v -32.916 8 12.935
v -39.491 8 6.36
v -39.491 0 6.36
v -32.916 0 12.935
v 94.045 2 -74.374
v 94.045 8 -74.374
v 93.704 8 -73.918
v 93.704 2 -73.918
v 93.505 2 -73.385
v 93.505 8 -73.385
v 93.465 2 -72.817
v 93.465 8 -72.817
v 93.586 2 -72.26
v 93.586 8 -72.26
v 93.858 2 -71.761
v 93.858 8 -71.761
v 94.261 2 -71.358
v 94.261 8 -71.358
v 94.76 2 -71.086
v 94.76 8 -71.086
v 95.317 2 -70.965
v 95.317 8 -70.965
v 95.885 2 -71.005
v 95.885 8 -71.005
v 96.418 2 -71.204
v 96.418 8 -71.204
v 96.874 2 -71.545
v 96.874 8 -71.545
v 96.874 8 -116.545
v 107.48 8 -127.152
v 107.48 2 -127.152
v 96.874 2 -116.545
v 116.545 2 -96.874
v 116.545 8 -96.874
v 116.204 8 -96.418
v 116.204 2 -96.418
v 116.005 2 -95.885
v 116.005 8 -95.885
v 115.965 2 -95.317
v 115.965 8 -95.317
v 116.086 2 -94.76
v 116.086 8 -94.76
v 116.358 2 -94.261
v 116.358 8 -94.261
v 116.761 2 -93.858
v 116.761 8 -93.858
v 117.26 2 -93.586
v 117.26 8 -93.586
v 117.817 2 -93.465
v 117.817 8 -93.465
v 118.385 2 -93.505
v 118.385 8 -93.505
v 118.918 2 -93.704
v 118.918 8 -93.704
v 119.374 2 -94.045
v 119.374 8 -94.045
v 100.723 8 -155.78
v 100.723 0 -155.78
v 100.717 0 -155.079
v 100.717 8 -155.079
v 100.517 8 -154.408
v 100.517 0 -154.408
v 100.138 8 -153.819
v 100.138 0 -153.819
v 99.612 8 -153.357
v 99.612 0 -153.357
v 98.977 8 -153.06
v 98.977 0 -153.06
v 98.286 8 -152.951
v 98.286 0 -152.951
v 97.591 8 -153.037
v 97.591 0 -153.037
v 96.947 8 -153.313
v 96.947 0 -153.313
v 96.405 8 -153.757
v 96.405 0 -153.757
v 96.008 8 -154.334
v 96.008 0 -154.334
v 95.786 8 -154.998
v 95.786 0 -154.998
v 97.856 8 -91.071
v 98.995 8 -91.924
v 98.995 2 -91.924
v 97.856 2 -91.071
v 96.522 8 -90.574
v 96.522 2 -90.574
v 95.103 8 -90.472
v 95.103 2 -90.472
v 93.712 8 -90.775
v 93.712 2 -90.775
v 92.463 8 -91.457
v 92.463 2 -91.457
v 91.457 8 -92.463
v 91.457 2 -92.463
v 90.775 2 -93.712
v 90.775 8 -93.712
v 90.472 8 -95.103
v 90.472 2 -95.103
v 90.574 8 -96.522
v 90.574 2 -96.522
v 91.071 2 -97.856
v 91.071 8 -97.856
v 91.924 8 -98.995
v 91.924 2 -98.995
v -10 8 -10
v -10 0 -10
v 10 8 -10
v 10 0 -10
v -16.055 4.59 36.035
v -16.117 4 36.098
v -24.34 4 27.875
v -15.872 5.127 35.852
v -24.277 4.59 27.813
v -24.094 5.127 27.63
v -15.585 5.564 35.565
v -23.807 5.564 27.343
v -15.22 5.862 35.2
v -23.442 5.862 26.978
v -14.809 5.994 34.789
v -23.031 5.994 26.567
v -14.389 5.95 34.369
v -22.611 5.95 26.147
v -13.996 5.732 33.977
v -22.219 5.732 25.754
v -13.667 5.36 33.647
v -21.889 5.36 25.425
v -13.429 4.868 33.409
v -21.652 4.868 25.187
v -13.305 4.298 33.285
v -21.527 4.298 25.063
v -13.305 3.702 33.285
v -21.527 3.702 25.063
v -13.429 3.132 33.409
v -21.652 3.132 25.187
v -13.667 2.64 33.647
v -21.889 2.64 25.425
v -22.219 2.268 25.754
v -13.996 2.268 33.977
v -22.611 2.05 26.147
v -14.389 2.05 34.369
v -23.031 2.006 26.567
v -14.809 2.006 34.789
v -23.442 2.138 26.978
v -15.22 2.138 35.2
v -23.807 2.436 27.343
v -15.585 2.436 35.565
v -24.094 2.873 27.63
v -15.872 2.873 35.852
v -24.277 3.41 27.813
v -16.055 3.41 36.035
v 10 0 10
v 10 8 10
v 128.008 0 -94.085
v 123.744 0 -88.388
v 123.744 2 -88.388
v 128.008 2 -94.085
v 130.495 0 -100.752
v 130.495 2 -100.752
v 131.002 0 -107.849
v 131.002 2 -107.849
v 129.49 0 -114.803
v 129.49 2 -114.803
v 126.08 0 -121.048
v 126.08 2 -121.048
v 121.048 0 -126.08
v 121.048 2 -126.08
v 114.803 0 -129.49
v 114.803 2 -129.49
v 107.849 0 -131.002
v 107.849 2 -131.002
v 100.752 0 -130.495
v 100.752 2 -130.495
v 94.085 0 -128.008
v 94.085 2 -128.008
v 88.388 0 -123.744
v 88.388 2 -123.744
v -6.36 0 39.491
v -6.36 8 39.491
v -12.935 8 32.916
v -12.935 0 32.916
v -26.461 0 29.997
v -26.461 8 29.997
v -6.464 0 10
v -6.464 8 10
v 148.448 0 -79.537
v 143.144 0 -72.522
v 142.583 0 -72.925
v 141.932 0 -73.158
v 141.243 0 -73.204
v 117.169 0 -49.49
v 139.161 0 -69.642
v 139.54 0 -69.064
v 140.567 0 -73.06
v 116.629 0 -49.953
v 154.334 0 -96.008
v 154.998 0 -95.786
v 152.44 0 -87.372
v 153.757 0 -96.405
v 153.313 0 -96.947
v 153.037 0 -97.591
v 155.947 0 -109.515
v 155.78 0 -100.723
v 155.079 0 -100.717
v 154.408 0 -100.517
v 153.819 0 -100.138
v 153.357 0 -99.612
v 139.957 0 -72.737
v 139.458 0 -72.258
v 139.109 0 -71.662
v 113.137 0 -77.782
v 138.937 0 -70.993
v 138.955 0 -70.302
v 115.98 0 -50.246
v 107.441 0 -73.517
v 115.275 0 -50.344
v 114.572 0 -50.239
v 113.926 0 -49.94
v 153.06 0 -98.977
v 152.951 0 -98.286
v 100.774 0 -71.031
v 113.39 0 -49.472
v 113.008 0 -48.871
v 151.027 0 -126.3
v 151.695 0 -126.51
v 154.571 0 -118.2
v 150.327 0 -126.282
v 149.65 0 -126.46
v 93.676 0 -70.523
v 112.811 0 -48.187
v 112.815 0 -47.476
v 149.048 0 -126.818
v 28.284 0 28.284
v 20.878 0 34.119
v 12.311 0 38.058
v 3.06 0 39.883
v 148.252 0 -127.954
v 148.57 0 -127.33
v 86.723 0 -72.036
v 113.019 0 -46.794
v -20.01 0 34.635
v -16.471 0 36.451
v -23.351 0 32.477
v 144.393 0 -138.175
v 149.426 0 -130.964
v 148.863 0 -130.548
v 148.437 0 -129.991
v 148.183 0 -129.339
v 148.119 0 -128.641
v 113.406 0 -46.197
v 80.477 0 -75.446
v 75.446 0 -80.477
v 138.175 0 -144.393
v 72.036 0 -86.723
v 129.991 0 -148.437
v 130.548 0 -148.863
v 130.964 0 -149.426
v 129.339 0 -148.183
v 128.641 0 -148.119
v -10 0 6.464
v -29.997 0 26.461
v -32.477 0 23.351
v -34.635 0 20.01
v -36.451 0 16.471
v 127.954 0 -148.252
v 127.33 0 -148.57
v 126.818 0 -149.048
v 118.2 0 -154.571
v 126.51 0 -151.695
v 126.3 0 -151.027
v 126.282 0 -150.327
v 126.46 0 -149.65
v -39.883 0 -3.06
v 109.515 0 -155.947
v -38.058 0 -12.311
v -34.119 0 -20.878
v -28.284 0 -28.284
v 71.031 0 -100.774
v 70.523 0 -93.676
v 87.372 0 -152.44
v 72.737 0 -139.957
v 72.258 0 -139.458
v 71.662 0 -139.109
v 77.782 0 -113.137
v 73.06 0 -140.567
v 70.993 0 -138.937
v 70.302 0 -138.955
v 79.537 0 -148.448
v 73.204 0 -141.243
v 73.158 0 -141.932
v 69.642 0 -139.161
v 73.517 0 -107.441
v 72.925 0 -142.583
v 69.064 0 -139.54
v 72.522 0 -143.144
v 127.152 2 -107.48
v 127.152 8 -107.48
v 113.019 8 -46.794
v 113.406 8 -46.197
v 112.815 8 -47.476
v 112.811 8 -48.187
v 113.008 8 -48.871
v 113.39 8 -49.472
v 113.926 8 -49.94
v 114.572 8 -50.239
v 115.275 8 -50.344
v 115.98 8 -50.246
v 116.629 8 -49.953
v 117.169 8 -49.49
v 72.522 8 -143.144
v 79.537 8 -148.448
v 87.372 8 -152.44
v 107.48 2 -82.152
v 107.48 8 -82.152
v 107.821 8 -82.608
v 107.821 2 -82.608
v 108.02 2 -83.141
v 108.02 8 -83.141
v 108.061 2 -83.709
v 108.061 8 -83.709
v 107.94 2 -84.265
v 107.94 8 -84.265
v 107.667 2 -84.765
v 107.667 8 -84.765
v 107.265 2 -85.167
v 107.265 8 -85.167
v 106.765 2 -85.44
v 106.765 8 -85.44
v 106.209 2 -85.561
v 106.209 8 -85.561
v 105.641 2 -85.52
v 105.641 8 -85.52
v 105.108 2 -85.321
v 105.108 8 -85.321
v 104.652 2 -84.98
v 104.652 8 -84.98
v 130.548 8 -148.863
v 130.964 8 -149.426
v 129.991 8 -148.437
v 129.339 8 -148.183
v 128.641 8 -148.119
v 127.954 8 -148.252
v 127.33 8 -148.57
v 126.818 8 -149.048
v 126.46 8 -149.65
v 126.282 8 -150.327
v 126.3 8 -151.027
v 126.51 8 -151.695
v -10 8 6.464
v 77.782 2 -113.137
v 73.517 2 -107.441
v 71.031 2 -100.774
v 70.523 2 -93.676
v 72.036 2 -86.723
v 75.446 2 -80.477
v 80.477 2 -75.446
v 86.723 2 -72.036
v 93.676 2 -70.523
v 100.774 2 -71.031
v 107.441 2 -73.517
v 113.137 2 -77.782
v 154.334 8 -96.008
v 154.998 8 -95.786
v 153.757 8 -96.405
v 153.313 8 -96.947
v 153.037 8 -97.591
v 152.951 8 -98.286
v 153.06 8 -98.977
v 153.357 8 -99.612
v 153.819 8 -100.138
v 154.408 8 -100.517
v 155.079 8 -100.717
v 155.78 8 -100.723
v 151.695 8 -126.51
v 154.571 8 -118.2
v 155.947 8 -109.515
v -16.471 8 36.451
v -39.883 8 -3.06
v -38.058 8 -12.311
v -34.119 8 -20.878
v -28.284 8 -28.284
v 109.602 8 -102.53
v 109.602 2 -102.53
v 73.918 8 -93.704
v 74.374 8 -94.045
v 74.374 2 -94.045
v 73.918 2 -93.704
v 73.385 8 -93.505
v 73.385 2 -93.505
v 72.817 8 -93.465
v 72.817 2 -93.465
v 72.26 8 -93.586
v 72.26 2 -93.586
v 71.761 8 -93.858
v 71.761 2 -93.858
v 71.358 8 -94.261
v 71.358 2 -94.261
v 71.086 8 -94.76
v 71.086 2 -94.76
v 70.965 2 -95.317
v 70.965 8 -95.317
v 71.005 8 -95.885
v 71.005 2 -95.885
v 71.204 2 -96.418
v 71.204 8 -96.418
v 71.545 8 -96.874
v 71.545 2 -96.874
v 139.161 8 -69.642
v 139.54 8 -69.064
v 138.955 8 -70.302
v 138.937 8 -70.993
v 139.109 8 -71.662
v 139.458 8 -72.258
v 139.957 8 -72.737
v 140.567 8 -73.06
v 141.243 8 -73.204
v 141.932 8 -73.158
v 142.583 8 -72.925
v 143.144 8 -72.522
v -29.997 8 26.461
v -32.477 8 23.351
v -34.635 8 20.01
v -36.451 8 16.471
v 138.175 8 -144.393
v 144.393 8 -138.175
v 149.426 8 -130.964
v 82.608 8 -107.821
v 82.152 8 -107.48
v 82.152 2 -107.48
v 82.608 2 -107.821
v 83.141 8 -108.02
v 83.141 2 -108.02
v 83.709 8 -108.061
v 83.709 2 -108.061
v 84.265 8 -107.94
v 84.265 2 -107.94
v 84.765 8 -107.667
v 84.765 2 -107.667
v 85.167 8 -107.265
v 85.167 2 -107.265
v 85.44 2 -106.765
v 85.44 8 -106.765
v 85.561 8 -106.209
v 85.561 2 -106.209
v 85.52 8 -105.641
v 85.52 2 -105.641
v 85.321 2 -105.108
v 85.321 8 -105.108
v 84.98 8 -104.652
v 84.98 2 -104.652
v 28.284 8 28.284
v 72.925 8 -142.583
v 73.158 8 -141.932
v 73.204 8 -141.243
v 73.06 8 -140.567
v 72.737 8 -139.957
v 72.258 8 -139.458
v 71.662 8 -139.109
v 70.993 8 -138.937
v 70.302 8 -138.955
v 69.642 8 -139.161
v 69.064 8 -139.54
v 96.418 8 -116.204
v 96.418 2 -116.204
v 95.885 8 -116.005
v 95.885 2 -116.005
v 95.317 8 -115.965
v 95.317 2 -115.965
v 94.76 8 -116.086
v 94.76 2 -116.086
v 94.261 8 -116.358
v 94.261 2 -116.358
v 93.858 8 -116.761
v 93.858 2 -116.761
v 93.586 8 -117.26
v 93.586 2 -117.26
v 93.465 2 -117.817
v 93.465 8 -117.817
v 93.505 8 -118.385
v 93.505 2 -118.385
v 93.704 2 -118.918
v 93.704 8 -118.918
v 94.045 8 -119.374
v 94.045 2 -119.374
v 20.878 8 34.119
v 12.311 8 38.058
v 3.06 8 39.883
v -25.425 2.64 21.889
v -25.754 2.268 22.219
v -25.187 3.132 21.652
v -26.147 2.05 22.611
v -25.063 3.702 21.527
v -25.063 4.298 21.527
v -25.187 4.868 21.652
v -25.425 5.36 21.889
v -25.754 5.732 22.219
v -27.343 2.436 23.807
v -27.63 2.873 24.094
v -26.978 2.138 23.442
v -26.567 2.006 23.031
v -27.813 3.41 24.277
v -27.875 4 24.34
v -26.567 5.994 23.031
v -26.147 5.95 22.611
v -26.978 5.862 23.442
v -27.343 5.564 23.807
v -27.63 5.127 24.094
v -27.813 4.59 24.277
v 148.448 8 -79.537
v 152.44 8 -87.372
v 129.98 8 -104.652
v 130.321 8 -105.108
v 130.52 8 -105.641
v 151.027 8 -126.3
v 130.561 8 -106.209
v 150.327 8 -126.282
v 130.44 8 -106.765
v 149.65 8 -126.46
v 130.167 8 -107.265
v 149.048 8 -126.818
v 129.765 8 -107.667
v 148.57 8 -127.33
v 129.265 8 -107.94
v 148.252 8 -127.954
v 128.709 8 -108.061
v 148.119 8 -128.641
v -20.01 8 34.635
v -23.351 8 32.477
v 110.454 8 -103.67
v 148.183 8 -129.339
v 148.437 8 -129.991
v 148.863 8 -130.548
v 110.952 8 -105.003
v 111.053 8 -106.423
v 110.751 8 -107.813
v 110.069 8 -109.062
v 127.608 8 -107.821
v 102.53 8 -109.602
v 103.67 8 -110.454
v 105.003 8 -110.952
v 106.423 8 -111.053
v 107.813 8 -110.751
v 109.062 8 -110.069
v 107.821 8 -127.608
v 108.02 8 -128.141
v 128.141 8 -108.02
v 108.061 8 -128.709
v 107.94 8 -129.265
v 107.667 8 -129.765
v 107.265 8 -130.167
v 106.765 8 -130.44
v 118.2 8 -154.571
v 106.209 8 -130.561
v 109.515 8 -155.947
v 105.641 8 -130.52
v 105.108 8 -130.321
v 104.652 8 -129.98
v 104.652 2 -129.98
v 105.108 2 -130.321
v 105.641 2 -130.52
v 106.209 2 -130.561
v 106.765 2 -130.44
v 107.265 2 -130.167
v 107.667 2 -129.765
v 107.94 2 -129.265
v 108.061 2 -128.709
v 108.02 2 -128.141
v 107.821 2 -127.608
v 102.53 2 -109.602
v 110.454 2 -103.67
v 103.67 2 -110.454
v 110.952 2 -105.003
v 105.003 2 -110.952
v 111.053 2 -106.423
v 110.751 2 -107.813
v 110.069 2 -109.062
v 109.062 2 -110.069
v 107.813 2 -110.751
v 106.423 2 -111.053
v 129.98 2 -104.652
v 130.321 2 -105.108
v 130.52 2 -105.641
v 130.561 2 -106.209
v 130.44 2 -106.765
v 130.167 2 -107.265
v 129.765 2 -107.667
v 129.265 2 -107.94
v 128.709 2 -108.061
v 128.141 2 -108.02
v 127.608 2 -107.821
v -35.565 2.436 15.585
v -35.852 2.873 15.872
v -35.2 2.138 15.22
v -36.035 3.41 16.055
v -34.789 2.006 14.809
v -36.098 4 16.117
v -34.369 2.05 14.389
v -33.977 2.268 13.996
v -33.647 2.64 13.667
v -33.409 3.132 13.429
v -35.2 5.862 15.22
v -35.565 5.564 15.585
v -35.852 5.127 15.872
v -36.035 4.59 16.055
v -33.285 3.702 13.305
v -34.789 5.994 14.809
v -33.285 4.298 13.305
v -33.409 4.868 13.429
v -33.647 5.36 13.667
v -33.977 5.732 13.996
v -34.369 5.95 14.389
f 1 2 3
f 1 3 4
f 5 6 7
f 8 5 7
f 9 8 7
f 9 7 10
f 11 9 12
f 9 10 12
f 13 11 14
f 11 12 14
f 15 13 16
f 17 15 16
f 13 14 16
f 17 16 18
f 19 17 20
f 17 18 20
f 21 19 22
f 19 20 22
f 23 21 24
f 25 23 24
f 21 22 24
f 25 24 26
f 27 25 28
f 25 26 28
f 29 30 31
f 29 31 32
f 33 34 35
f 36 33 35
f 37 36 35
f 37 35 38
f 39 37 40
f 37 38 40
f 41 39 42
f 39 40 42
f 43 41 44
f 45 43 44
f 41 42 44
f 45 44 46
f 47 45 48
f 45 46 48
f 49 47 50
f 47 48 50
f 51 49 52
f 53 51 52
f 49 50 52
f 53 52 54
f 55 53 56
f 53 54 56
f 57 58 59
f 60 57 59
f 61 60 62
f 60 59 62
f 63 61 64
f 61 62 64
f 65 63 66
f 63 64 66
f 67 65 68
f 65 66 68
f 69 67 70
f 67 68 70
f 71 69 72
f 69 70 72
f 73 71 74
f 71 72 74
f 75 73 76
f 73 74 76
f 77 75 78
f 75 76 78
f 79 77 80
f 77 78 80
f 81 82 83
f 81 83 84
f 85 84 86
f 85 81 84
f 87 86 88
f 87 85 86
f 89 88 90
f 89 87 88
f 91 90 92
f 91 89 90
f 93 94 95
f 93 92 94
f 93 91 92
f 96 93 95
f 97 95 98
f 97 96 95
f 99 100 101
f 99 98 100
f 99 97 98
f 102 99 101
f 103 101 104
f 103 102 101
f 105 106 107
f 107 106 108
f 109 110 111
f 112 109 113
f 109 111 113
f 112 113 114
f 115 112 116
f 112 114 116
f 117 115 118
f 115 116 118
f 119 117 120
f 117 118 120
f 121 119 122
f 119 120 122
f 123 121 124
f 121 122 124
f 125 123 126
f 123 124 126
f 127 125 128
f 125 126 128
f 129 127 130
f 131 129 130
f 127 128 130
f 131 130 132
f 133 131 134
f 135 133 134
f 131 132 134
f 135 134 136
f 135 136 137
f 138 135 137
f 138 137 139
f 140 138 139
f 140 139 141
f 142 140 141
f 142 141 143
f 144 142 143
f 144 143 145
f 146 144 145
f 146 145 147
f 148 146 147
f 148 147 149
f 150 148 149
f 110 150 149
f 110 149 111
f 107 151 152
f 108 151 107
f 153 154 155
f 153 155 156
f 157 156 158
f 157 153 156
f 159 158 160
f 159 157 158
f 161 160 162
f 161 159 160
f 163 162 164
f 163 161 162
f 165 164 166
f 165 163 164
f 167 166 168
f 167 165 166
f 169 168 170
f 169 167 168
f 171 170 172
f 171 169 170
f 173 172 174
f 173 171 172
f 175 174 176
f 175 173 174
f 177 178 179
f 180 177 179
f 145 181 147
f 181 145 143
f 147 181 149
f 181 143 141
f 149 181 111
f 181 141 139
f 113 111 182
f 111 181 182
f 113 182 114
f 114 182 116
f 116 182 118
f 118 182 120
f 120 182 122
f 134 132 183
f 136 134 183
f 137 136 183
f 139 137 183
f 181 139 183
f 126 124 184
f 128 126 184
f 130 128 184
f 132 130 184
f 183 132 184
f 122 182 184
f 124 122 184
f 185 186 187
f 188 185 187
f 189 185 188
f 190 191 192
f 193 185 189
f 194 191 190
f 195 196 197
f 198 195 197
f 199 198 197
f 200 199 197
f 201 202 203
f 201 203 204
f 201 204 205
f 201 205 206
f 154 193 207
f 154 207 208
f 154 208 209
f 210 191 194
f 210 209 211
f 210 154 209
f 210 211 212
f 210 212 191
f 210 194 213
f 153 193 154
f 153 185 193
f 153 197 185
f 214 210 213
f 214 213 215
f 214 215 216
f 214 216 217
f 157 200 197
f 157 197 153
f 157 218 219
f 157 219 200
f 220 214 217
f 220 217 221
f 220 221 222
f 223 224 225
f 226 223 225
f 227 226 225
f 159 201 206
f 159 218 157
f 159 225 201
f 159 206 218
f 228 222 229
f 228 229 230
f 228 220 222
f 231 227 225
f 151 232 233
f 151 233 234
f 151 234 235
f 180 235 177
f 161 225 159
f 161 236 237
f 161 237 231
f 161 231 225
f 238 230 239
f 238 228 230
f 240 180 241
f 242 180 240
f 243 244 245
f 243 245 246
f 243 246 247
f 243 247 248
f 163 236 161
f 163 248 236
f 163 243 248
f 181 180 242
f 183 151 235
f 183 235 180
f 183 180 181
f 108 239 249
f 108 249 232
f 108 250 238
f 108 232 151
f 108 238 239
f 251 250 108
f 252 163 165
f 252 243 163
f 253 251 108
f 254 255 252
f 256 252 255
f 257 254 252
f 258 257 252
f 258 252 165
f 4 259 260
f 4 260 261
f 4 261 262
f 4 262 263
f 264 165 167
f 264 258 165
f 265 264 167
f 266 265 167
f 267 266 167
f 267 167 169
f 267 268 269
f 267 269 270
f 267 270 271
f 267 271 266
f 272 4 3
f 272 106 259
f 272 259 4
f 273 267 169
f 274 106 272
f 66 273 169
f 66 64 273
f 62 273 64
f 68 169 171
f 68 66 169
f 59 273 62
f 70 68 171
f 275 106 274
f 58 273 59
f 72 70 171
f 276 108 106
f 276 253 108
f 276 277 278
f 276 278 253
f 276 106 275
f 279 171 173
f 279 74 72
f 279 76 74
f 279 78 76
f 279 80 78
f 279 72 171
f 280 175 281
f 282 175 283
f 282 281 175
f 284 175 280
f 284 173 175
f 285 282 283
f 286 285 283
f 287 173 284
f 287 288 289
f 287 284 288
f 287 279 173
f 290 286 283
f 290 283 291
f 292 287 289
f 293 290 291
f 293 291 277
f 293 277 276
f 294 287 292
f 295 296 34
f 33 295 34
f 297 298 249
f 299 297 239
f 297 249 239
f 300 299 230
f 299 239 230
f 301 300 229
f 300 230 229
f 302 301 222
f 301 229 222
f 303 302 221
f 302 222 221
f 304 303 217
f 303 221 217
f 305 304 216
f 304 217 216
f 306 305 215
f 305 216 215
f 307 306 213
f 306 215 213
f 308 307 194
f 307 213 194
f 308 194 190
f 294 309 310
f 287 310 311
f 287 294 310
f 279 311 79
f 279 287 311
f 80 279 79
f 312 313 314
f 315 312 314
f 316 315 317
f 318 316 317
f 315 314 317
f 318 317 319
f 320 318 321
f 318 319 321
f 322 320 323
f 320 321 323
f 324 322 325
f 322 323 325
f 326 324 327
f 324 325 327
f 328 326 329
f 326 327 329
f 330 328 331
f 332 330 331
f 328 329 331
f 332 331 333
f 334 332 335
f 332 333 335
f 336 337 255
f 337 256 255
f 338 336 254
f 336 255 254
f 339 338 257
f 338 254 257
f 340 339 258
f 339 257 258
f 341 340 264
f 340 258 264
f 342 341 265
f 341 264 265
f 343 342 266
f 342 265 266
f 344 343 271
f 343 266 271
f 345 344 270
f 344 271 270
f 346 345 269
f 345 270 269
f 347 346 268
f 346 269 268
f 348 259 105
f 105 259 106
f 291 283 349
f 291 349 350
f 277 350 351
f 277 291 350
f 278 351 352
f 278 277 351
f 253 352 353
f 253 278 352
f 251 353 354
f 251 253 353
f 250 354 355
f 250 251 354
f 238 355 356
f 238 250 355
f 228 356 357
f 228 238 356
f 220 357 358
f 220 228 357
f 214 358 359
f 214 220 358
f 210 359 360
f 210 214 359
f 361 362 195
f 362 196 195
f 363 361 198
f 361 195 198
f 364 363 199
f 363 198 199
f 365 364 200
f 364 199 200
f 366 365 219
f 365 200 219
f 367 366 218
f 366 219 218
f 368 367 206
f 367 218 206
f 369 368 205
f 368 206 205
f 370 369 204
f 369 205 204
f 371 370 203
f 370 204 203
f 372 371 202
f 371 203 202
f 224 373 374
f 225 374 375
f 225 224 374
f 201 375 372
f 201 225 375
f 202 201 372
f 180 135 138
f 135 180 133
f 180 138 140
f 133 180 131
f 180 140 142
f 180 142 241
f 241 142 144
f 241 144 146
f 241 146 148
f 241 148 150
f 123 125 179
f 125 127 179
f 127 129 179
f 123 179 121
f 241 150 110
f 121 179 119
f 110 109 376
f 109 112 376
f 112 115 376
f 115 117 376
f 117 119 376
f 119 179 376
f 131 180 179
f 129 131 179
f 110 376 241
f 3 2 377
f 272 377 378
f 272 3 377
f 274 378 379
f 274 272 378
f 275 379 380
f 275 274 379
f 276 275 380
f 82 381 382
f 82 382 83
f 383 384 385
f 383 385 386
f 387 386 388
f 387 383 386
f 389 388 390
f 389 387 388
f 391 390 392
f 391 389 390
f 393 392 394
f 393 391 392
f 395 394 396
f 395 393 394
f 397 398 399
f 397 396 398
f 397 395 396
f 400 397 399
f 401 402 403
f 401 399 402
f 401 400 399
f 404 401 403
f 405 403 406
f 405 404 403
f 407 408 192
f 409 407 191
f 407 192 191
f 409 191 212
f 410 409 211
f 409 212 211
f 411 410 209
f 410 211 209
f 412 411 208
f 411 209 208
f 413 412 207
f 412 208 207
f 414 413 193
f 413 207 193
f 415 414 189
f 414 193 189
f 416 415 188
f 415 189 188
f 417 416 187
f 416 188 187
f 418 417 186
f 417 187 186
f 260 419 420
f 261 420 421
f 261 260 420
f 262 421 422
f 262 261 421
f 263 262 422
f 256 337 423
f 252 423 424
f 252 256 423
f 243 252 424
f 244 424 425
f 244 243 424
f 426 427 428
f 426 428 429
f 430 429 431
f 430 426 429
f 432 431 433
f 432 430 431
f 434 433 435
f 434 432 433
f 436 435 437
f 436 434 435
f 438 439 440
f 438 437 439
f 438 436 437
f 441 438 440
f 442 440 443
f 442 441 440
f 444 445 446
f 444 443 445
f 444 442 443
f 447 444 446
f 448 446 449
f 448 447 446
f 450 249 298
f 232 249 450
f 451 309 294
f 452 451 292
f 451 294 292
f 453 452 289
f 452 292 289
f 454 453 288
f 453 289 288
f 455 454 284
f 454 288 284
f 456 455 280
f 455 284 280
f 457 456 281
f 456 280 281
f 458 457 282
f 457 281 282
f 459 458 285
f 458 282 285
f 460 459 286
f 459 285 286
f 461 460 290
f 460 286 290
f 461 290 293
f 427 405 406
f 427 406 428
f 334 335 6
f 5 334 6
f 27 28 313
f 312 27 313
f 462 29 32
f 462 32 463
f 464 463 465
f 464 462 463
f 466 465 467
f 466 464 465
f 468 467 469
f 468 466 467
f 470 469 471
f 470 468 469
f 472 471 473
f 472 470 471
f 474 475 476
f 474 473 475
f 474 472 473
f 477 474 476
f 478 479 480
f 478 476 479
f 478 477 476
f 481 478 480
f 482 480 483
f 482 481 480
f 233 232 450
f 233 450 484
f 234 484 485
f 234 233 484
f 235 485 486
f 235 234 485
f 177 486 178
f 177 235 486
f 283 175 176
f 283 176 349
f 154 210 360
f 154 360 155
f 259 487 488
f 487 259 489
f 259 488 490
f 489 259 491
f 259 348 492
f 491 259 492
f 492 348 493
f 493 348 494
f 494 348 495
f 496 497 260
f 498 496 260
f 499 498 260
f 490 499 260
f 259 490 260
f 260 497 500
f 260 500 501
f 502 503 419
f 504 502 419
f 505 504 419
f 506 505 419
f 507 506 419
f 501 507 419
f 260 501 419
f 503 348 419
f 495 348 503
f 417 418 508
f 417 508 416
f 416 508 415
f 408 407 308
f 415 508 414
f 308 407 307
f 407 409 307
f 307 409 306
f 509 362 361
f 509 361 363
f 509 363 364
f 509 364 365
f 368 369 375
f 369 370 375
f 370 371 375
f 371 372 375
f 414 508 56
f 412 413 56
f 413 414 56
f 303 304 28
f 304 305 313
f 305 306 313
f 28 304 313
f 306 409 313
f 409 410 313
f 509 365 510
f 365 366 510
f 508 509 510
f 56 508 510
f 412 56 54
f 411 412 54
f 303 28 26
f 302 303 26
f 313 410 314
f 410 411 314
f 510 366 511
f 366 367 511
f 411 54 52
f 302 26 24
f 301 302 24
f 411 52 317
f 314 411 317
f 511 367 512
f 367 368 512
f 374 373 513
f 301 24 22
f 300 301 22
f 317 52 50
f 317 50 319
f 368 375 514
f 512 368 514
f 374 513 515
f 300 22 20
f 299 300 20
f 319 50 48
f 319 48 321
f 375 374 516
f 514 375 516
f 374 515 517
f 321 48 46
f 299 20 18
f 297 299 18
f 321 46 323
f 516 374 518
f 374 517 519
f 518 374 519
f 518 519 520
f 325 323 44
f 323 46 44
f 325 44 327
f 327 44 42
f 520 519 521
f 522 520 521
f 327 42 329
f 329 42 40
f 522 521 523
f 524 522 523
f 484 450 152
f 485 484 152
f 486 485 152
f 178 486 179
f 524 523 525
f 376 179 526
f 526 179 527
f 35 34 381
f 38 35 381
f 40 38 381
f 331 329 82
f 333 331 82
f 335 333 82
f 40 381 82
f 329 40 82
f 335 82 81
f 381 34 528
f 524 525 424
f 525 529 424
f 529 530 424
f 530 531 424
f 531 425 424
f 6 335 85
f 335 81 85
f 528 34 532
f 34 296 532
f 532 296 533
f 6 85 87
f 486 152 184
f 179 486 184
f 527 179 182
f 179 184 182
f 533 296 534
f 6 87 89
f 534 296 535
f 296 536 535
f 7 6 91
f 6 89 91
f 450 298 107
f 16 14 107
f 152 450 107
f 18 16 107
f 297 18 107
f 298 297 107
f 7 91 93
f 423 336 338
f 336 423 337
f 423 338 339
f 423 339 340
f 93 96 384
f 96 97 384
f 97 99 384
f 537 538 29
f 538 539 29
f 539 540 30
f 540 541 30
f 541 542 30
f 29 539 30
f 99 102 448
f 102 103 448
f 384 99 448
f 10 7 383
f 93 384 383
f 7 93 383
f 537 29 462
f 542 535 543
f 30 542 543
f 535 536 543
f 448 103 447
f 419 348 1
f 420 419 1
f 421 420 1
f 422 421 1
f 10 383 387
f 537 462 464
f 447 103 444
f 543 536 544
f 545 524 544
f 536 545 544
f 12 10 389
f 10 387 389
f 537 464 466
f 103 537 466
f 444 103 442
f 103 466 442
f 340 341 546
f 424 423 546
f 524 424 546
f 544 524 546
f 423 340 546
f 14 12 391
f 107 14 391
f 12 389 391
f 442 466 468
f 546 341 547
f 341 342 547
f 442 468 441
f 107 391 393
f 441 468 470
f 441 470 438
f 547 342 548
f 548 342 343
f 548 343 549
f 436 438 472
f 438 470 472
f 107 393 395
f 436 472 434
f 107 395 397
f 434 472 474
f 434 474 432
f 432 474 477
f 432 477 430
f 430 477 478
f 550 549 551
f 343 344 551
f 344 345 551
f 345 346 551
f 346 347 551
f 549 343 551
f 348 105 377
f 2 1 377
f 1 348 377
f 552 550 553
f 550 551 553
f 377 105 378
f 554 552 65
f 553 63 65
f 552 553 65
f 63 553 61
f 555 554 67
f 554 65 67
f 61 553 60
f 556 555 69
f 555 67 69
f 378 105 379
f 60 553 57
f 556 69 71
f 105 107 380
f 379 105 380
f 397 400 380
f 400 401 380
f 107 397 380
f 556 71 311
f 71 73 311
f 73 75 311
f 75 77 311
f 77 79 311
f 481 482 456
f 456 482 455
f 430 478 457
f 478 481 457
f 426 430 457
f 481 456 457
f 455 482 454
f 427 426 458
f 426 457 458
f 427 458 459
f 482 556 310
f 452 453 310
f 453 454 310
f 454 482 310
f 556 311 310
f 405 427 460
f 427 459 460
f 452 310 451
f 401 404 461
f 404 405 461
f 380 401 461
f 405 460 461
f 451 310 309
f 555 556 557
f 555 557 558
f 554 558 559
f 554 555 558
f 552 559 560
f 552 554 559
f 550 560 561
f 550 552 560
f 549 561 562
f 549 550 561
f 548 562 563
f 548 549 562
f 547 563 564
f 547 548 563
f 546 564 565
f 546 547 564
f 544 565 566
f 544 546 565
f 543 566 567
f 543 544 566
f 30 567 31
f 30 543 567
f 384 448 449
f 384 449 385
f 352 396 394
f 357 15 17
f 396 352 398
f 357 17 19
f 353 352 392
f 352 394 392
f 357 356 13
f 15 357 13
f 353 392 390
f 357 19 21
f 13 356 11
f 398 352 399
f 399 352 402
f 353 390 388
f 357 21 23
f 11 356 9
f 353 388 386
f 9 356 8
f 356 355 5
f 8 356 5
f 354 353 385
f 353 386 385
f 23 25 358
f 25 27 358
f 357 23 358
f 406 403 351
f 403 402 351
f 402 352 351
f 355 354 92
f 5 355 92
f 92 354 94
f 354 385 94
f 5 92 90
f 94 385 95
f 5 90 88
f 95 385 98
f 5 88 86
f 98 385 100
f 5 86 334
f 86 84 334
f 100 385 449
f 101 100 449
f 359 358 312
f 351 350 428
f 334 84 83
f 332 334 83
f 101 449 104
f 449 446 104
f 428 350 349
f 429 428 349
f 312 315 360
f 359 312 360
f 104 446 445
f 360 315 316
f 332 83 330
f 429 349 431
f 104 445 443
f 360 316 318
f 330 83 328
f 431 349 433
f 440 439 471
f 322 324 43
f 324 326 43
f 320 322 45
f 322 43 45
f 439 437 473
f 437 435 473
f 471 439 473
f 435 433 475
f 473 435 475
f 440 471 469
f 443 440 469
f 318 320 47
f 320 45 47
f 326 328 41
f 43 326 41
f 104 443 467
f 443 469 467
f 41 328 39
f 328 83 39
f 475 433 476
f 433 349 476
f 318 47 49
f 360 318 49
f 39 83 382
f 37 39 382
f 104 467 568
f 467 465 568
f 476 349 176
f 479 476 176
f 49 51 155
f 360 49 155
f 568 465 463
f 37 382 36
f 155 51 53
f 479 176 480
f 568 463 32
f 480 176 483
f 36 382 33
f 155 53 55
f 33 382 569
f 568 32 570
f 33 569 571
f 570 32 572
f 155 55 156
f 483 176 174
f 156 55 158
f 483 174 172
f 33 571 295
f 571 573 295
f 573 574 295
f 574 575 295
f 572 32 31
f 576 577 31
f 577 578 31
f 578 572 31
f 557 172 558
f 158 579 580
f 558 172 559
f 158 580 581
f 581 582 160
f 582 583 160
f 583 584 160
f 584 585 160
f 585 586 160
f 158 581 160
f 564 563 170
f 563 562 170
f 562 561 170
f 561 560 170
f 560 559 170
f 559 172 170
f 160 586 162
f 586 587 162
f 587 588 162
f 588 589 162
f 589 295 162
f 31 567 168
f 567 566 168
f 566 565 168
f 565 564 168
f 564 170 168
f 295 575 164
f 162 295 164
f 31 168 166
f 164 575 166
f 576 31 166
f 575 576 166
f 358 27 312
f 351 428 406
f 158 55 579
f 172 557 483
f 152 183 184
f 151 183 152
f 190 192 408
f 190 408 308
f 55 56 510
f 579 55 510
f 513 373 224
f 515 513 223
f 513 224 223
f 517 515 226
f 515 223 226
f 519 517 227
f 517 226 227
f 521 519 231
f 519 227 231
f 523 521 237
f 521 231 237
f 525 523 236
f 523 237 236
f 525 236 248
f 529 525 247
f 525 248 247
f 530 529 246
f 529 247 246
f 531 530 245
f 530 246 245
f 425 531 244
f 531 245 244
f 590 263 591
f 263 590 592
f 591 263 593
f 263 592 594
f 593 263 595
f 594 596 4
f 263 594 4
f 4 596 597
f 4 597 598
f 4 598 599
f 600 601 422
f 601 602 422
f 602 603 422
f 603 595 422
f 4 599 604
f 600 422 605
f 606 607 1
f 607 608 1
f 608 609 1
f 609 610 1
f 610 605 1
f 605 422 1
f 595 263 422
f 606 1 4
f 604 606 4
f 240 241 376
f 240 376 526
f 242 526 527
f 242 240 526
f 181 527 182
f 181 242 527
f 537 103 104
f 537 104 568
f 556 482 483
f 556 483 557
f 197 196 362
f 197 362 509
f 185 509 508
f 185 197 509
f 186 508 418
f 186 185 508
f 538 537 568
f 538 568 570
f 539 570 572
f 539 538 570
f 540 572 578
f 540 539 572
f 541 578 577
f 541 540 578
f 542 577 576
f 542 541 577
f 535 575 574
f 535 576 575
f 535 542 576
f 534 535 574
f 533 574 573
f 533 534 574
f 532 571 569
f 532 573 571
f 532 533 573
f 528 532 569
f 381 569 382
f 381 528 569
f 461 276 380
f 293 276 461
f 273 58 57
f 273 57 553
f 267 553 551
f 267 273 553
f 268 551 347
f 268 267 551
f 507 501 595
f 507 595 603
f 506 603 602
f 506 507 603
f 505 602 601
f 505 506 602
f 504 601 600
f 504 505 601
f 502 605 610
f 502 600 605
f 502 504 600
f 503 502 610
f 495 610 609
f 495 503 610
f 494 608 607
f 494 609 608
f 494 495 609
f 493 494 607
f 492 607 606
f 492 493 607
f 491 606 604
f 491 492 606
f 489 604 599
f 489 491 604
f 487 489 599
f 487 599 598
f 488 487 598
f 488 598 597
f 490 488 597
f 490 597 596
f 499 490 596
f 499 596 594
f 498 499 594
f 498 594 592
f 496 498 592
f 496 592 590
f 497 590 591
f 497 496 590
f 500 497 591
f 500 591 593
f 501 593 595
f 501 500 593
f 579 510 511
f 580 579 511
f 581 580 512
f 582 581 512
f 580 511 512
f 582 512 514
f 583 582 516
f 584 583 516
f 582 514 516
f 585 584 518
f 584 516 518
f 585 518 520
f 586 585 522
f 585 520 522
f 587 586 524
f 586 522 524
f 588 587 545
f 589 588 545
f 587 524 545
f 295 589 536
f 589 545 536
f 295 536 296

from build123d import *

# Parameters (mm, degrees)
ESQUISSE1_W                  = 20
ESQUISSE1_H                  = 20
BOSS_EXTRU_1_DEPTH           = 8
ENL_V_MAT_EXTRU_1_DEPTH      = 9
ESQUISSE4_R                  = 2
ENL_V_MAT_EXTRU_2_DEPTH      = 142.139610307
ENL_V_MAT_EXTRU_2_DEPTH_BACK = 137.139610307
ENL_V_MAT_EXTRU_3_DEPTH      = 9.0000001
ENL_V_MAT_EXTRU_4_DEPTH      = 9
ESQUISSE9_R                  = 2.5
ENL_V_MAT_EXTRU_6_DEPTH      = 9
ENL_V_MAT_EXTRU_8_DEPTH      = 2


with BuildPart() as part:
    # Esquisse1 → Boss.-Extru.1 (new body)
    with BuildSketch(Plane(origin=(0, 0, 0), x_dir=(1, 0, 0), z_dir=(0, 1, 0))):
        with BuildLine():
            Line((-28.284271247, 28.284271247), (70.710678119, 141.421356237))
            ThreePointArc((70.710678119, 141.421356237), (141.421356237, 141.421356237), (141.421356237, 70.710678119))
            Line((141.421356237, 70.710678119), (28.284271247, -28.284271247))
            ThreePointArc((28.284271247, -28.284271247), (-28.284271247, -28.284271247), (-28.284271247, 28.284271247))
        make_face()
        Rectangle(ESQUISSE1_W, ESQUISSE1_H, mode=Mode.SUBTRACT)
    extrude(amount=BOSS_EXTRU_1_DEPTH)

    # Esquisse3 → Enlèv. mat.-Extru.1 (cut, through all)
    with BuildSketch(Plane(origin=(0, 8, 0), x_dir=(1, 0, 0), z_dir=(0, 1, 0))):
        Polygon((-8.232233047, -11.767766953), (-27.234385984, -30.76991989), (-30.76991989, -27.234385984), (-11.767766953, -8.232233047), (-9.726873799, -6.191339893), (-6.191339893, -9.726873799), align=None)
    extrude(amount=-ENL_V_MAT_EXTRU_1_DEPTH, mode=Mode.SUBTRACT)

    # Esquisse4 → Enlèv. mat.-Extru.2 (cut, two sides)
    with BuildSketch(Plane(origin=(1.767766953, 0, 1.767766953), x_dir=(-0.707106781, 0, 0.707106781), z_dir=(-0.707106781, 0, -0.707106781))) as enl_v_mat_extru_2_sk:
        with Locations((34.921798557, 4)):
            Circle(ESQUISSE4_R)
    extrude(amount=ENL_V_MAT_EXTRU_2_DEPTH, mode=Mode.SUBTRACT)
    extrude(enl_v_mat_extru_2_sk.sketch, amount=-ENL_V_MAT_EXTRU_2_DEPTH_BACK, mode=Mode.SUBTRACT)

    # Esquisse5 → Enlèv. mat.-Extru.3 (cut, through all)
    with BuildSketch(Plane(origin=(0, 8, 0), x_dir=(1, 0, 0), z_dir=(0, 1, 0))):
        Polygon((-34.683660608, -14.703220533), (-36.451427561, -16.470987486), (-40.908486709, -7.777625617), (-39.491104164, -6.360243072), (-32.915893655, -12.93545358), align=None)
        Polygon((-7.777625617, -40.908486709), (-6.360243072, -39.491104164), (-12.93545358, -32.915893655), (-14.703220533, -34.683660608), (-16.470987486, -36.451427561), align=None)
    extrude(amount=-ENL_V_MAT_EXTRU_3_DEPTH, mode=Mode.SUBTRACT)

    # Esquisse7 → Enlèv. mat.-Extru.4 (cut, through all)
    with BuildSketch(Plane(origin=(0, 8, 0), x_dir=(1, 0, 0), z_dir=(0, 1, 0))):
        with BuildLine():
            Line((91.923881554, 98.994949366), (102.530483272, 109.601551084))
            ThreePointArc((102.530483272, 109.601551084), (109.601551084, 109.601551084), (109.601551084, 102.530483272))
            Line((109.601551084, 102.530483272), (98.994949366, 91.923881554))
            ThreePointArc((98.994949366, 91.923881554), (91.923881554, 91.923881554), (91.923881554, 98.994949366))
        make_face()
        with BuildLine():
            Line((94.045201898, 119.373629023), (104.651803616, 129.98023074))
            ThreePointArc((104.651803616, 129.98023074), (107.48023074, 129.98023074), (107.48023074, 127.151803616))
            Line((107.48023074, 127.151803616), (96.873629023, 116.545201898))
            ThreePointArc((96.873629023, 116.545201898), (94.045201898, 116.545201898), (94.045201898, 119.373629023))
        make_face()
        with BuildLine():
            Line((71.545201898, 96.873629023), (82.151803616, 107.48023074))
            ThreePointArc((82.151803616, 107.48023074), (84.98023074, 107.48023074), (84.98023074, 104.651803616))
            Line((84.98023074, 104.651803616), (74.373629023, 94.045201898))
            ThreePointArc((74.373629023, 94.045201898), (71.545201898, 94.045201898), (71.545201898, 96.873629023))
        make_face()
        with BuildLine():
            Line((119.373629023, 94.045201898), (129.98023074, 104.651803616))
            ThreePointArc((129.98023074, 104.651803616), (129.98023074, 107.48023074), (127.151803616, 107.48023074))
            Line((127.151803616, 107.48023074), (116.545201898, 96.873629023))
            ThreePointArc((116.545201898, 96.873629023), (116.545201898, 94.045201898), (119.373629023, 94.045201898))
        make_face()
        with BuildLine():
            Line((96.873629023, 71.545201898), (107.48023074, 82.151803616))
            ThreePointArc((107.48023074, 82.151803616), (107.48023074, 84.98023074), (104.651803616, 84.98023074))
            Line((104.651803616, 84.98023074), (94.045201898, 74.373629023))
            ThreePointArc((94.045201898, 74.373629023), (94.045201898, 71.545201898), (96.873629023, 71.545201898))
        make_face()
    extrude(amount=-ENL_V_MAT_EXTRU_4_DEPTH, mode=Mode.SUBTRACT)

    # Esquisse9 → Enlèv. mat.-Extru.6 (cut, through all)
    with BuildSketch(Plane(origin=(0, 0, 0), x_dir=(-1, 0, 0), z_dir=(0, -1, 0))):
        with Locations((-70.710678119, 141.421356237)):
            Circle(ESQUISSE9_R)
        with Locations((-98.244293926, 155.450434208)):
            Circle(ESQUISSE9_R)
        with Locations((-128.765542165, 150.616343387)):
            Circle(ESQUISSE9_R)
        with Locations((-150.616343387, 128.765542165)):
            Circle(ESQUISSE9_R)
        with Locations((-155.450434208, 98.244293926)):
            Circle(ESQUISSE9_R)
        with Locations((-141.421356237, 70.710678119)):
            Circle(ESQUISSE9_R)
        with Locations((-115.287543419, 47.843591903)):
            Circle(ESQUISSE9_R)
    extrude(amount=-ENL_V_MAT_EXTRU_6_DEPTH, mode=Mode.SUBTRACT)

    # Esquisse11 → Enlèv. mat.-Extru.8 (cut)
    with BuildSketch(Plane(origin=(0, 0, 0), x_dir=(-1, 0, 0), z_dir=(0, -1, 0))):
        with BuildLine():
            Line((-88.388347648, 123.743686708), (-77.781745931, 113.13708499))
            ThreePointArc((-77.781745931, 113.13708499), (-77.781745931, 77.781745931), (-113.13708499, 77.781745931))
            Line((-113.13708499, 77.781745931), (-123.743686708, 88.388347648))
            ThreePointArc((-123.743686708, 88.388347648), (-123.743686708, 123.743686708), (-88.388347648, 123.743686708))
        make_face()
    extrude(amount=-ENL_V_MAT_EXTRU_8_DEPTH, mode=Mode.SUBTRACT)


solid = part.part
